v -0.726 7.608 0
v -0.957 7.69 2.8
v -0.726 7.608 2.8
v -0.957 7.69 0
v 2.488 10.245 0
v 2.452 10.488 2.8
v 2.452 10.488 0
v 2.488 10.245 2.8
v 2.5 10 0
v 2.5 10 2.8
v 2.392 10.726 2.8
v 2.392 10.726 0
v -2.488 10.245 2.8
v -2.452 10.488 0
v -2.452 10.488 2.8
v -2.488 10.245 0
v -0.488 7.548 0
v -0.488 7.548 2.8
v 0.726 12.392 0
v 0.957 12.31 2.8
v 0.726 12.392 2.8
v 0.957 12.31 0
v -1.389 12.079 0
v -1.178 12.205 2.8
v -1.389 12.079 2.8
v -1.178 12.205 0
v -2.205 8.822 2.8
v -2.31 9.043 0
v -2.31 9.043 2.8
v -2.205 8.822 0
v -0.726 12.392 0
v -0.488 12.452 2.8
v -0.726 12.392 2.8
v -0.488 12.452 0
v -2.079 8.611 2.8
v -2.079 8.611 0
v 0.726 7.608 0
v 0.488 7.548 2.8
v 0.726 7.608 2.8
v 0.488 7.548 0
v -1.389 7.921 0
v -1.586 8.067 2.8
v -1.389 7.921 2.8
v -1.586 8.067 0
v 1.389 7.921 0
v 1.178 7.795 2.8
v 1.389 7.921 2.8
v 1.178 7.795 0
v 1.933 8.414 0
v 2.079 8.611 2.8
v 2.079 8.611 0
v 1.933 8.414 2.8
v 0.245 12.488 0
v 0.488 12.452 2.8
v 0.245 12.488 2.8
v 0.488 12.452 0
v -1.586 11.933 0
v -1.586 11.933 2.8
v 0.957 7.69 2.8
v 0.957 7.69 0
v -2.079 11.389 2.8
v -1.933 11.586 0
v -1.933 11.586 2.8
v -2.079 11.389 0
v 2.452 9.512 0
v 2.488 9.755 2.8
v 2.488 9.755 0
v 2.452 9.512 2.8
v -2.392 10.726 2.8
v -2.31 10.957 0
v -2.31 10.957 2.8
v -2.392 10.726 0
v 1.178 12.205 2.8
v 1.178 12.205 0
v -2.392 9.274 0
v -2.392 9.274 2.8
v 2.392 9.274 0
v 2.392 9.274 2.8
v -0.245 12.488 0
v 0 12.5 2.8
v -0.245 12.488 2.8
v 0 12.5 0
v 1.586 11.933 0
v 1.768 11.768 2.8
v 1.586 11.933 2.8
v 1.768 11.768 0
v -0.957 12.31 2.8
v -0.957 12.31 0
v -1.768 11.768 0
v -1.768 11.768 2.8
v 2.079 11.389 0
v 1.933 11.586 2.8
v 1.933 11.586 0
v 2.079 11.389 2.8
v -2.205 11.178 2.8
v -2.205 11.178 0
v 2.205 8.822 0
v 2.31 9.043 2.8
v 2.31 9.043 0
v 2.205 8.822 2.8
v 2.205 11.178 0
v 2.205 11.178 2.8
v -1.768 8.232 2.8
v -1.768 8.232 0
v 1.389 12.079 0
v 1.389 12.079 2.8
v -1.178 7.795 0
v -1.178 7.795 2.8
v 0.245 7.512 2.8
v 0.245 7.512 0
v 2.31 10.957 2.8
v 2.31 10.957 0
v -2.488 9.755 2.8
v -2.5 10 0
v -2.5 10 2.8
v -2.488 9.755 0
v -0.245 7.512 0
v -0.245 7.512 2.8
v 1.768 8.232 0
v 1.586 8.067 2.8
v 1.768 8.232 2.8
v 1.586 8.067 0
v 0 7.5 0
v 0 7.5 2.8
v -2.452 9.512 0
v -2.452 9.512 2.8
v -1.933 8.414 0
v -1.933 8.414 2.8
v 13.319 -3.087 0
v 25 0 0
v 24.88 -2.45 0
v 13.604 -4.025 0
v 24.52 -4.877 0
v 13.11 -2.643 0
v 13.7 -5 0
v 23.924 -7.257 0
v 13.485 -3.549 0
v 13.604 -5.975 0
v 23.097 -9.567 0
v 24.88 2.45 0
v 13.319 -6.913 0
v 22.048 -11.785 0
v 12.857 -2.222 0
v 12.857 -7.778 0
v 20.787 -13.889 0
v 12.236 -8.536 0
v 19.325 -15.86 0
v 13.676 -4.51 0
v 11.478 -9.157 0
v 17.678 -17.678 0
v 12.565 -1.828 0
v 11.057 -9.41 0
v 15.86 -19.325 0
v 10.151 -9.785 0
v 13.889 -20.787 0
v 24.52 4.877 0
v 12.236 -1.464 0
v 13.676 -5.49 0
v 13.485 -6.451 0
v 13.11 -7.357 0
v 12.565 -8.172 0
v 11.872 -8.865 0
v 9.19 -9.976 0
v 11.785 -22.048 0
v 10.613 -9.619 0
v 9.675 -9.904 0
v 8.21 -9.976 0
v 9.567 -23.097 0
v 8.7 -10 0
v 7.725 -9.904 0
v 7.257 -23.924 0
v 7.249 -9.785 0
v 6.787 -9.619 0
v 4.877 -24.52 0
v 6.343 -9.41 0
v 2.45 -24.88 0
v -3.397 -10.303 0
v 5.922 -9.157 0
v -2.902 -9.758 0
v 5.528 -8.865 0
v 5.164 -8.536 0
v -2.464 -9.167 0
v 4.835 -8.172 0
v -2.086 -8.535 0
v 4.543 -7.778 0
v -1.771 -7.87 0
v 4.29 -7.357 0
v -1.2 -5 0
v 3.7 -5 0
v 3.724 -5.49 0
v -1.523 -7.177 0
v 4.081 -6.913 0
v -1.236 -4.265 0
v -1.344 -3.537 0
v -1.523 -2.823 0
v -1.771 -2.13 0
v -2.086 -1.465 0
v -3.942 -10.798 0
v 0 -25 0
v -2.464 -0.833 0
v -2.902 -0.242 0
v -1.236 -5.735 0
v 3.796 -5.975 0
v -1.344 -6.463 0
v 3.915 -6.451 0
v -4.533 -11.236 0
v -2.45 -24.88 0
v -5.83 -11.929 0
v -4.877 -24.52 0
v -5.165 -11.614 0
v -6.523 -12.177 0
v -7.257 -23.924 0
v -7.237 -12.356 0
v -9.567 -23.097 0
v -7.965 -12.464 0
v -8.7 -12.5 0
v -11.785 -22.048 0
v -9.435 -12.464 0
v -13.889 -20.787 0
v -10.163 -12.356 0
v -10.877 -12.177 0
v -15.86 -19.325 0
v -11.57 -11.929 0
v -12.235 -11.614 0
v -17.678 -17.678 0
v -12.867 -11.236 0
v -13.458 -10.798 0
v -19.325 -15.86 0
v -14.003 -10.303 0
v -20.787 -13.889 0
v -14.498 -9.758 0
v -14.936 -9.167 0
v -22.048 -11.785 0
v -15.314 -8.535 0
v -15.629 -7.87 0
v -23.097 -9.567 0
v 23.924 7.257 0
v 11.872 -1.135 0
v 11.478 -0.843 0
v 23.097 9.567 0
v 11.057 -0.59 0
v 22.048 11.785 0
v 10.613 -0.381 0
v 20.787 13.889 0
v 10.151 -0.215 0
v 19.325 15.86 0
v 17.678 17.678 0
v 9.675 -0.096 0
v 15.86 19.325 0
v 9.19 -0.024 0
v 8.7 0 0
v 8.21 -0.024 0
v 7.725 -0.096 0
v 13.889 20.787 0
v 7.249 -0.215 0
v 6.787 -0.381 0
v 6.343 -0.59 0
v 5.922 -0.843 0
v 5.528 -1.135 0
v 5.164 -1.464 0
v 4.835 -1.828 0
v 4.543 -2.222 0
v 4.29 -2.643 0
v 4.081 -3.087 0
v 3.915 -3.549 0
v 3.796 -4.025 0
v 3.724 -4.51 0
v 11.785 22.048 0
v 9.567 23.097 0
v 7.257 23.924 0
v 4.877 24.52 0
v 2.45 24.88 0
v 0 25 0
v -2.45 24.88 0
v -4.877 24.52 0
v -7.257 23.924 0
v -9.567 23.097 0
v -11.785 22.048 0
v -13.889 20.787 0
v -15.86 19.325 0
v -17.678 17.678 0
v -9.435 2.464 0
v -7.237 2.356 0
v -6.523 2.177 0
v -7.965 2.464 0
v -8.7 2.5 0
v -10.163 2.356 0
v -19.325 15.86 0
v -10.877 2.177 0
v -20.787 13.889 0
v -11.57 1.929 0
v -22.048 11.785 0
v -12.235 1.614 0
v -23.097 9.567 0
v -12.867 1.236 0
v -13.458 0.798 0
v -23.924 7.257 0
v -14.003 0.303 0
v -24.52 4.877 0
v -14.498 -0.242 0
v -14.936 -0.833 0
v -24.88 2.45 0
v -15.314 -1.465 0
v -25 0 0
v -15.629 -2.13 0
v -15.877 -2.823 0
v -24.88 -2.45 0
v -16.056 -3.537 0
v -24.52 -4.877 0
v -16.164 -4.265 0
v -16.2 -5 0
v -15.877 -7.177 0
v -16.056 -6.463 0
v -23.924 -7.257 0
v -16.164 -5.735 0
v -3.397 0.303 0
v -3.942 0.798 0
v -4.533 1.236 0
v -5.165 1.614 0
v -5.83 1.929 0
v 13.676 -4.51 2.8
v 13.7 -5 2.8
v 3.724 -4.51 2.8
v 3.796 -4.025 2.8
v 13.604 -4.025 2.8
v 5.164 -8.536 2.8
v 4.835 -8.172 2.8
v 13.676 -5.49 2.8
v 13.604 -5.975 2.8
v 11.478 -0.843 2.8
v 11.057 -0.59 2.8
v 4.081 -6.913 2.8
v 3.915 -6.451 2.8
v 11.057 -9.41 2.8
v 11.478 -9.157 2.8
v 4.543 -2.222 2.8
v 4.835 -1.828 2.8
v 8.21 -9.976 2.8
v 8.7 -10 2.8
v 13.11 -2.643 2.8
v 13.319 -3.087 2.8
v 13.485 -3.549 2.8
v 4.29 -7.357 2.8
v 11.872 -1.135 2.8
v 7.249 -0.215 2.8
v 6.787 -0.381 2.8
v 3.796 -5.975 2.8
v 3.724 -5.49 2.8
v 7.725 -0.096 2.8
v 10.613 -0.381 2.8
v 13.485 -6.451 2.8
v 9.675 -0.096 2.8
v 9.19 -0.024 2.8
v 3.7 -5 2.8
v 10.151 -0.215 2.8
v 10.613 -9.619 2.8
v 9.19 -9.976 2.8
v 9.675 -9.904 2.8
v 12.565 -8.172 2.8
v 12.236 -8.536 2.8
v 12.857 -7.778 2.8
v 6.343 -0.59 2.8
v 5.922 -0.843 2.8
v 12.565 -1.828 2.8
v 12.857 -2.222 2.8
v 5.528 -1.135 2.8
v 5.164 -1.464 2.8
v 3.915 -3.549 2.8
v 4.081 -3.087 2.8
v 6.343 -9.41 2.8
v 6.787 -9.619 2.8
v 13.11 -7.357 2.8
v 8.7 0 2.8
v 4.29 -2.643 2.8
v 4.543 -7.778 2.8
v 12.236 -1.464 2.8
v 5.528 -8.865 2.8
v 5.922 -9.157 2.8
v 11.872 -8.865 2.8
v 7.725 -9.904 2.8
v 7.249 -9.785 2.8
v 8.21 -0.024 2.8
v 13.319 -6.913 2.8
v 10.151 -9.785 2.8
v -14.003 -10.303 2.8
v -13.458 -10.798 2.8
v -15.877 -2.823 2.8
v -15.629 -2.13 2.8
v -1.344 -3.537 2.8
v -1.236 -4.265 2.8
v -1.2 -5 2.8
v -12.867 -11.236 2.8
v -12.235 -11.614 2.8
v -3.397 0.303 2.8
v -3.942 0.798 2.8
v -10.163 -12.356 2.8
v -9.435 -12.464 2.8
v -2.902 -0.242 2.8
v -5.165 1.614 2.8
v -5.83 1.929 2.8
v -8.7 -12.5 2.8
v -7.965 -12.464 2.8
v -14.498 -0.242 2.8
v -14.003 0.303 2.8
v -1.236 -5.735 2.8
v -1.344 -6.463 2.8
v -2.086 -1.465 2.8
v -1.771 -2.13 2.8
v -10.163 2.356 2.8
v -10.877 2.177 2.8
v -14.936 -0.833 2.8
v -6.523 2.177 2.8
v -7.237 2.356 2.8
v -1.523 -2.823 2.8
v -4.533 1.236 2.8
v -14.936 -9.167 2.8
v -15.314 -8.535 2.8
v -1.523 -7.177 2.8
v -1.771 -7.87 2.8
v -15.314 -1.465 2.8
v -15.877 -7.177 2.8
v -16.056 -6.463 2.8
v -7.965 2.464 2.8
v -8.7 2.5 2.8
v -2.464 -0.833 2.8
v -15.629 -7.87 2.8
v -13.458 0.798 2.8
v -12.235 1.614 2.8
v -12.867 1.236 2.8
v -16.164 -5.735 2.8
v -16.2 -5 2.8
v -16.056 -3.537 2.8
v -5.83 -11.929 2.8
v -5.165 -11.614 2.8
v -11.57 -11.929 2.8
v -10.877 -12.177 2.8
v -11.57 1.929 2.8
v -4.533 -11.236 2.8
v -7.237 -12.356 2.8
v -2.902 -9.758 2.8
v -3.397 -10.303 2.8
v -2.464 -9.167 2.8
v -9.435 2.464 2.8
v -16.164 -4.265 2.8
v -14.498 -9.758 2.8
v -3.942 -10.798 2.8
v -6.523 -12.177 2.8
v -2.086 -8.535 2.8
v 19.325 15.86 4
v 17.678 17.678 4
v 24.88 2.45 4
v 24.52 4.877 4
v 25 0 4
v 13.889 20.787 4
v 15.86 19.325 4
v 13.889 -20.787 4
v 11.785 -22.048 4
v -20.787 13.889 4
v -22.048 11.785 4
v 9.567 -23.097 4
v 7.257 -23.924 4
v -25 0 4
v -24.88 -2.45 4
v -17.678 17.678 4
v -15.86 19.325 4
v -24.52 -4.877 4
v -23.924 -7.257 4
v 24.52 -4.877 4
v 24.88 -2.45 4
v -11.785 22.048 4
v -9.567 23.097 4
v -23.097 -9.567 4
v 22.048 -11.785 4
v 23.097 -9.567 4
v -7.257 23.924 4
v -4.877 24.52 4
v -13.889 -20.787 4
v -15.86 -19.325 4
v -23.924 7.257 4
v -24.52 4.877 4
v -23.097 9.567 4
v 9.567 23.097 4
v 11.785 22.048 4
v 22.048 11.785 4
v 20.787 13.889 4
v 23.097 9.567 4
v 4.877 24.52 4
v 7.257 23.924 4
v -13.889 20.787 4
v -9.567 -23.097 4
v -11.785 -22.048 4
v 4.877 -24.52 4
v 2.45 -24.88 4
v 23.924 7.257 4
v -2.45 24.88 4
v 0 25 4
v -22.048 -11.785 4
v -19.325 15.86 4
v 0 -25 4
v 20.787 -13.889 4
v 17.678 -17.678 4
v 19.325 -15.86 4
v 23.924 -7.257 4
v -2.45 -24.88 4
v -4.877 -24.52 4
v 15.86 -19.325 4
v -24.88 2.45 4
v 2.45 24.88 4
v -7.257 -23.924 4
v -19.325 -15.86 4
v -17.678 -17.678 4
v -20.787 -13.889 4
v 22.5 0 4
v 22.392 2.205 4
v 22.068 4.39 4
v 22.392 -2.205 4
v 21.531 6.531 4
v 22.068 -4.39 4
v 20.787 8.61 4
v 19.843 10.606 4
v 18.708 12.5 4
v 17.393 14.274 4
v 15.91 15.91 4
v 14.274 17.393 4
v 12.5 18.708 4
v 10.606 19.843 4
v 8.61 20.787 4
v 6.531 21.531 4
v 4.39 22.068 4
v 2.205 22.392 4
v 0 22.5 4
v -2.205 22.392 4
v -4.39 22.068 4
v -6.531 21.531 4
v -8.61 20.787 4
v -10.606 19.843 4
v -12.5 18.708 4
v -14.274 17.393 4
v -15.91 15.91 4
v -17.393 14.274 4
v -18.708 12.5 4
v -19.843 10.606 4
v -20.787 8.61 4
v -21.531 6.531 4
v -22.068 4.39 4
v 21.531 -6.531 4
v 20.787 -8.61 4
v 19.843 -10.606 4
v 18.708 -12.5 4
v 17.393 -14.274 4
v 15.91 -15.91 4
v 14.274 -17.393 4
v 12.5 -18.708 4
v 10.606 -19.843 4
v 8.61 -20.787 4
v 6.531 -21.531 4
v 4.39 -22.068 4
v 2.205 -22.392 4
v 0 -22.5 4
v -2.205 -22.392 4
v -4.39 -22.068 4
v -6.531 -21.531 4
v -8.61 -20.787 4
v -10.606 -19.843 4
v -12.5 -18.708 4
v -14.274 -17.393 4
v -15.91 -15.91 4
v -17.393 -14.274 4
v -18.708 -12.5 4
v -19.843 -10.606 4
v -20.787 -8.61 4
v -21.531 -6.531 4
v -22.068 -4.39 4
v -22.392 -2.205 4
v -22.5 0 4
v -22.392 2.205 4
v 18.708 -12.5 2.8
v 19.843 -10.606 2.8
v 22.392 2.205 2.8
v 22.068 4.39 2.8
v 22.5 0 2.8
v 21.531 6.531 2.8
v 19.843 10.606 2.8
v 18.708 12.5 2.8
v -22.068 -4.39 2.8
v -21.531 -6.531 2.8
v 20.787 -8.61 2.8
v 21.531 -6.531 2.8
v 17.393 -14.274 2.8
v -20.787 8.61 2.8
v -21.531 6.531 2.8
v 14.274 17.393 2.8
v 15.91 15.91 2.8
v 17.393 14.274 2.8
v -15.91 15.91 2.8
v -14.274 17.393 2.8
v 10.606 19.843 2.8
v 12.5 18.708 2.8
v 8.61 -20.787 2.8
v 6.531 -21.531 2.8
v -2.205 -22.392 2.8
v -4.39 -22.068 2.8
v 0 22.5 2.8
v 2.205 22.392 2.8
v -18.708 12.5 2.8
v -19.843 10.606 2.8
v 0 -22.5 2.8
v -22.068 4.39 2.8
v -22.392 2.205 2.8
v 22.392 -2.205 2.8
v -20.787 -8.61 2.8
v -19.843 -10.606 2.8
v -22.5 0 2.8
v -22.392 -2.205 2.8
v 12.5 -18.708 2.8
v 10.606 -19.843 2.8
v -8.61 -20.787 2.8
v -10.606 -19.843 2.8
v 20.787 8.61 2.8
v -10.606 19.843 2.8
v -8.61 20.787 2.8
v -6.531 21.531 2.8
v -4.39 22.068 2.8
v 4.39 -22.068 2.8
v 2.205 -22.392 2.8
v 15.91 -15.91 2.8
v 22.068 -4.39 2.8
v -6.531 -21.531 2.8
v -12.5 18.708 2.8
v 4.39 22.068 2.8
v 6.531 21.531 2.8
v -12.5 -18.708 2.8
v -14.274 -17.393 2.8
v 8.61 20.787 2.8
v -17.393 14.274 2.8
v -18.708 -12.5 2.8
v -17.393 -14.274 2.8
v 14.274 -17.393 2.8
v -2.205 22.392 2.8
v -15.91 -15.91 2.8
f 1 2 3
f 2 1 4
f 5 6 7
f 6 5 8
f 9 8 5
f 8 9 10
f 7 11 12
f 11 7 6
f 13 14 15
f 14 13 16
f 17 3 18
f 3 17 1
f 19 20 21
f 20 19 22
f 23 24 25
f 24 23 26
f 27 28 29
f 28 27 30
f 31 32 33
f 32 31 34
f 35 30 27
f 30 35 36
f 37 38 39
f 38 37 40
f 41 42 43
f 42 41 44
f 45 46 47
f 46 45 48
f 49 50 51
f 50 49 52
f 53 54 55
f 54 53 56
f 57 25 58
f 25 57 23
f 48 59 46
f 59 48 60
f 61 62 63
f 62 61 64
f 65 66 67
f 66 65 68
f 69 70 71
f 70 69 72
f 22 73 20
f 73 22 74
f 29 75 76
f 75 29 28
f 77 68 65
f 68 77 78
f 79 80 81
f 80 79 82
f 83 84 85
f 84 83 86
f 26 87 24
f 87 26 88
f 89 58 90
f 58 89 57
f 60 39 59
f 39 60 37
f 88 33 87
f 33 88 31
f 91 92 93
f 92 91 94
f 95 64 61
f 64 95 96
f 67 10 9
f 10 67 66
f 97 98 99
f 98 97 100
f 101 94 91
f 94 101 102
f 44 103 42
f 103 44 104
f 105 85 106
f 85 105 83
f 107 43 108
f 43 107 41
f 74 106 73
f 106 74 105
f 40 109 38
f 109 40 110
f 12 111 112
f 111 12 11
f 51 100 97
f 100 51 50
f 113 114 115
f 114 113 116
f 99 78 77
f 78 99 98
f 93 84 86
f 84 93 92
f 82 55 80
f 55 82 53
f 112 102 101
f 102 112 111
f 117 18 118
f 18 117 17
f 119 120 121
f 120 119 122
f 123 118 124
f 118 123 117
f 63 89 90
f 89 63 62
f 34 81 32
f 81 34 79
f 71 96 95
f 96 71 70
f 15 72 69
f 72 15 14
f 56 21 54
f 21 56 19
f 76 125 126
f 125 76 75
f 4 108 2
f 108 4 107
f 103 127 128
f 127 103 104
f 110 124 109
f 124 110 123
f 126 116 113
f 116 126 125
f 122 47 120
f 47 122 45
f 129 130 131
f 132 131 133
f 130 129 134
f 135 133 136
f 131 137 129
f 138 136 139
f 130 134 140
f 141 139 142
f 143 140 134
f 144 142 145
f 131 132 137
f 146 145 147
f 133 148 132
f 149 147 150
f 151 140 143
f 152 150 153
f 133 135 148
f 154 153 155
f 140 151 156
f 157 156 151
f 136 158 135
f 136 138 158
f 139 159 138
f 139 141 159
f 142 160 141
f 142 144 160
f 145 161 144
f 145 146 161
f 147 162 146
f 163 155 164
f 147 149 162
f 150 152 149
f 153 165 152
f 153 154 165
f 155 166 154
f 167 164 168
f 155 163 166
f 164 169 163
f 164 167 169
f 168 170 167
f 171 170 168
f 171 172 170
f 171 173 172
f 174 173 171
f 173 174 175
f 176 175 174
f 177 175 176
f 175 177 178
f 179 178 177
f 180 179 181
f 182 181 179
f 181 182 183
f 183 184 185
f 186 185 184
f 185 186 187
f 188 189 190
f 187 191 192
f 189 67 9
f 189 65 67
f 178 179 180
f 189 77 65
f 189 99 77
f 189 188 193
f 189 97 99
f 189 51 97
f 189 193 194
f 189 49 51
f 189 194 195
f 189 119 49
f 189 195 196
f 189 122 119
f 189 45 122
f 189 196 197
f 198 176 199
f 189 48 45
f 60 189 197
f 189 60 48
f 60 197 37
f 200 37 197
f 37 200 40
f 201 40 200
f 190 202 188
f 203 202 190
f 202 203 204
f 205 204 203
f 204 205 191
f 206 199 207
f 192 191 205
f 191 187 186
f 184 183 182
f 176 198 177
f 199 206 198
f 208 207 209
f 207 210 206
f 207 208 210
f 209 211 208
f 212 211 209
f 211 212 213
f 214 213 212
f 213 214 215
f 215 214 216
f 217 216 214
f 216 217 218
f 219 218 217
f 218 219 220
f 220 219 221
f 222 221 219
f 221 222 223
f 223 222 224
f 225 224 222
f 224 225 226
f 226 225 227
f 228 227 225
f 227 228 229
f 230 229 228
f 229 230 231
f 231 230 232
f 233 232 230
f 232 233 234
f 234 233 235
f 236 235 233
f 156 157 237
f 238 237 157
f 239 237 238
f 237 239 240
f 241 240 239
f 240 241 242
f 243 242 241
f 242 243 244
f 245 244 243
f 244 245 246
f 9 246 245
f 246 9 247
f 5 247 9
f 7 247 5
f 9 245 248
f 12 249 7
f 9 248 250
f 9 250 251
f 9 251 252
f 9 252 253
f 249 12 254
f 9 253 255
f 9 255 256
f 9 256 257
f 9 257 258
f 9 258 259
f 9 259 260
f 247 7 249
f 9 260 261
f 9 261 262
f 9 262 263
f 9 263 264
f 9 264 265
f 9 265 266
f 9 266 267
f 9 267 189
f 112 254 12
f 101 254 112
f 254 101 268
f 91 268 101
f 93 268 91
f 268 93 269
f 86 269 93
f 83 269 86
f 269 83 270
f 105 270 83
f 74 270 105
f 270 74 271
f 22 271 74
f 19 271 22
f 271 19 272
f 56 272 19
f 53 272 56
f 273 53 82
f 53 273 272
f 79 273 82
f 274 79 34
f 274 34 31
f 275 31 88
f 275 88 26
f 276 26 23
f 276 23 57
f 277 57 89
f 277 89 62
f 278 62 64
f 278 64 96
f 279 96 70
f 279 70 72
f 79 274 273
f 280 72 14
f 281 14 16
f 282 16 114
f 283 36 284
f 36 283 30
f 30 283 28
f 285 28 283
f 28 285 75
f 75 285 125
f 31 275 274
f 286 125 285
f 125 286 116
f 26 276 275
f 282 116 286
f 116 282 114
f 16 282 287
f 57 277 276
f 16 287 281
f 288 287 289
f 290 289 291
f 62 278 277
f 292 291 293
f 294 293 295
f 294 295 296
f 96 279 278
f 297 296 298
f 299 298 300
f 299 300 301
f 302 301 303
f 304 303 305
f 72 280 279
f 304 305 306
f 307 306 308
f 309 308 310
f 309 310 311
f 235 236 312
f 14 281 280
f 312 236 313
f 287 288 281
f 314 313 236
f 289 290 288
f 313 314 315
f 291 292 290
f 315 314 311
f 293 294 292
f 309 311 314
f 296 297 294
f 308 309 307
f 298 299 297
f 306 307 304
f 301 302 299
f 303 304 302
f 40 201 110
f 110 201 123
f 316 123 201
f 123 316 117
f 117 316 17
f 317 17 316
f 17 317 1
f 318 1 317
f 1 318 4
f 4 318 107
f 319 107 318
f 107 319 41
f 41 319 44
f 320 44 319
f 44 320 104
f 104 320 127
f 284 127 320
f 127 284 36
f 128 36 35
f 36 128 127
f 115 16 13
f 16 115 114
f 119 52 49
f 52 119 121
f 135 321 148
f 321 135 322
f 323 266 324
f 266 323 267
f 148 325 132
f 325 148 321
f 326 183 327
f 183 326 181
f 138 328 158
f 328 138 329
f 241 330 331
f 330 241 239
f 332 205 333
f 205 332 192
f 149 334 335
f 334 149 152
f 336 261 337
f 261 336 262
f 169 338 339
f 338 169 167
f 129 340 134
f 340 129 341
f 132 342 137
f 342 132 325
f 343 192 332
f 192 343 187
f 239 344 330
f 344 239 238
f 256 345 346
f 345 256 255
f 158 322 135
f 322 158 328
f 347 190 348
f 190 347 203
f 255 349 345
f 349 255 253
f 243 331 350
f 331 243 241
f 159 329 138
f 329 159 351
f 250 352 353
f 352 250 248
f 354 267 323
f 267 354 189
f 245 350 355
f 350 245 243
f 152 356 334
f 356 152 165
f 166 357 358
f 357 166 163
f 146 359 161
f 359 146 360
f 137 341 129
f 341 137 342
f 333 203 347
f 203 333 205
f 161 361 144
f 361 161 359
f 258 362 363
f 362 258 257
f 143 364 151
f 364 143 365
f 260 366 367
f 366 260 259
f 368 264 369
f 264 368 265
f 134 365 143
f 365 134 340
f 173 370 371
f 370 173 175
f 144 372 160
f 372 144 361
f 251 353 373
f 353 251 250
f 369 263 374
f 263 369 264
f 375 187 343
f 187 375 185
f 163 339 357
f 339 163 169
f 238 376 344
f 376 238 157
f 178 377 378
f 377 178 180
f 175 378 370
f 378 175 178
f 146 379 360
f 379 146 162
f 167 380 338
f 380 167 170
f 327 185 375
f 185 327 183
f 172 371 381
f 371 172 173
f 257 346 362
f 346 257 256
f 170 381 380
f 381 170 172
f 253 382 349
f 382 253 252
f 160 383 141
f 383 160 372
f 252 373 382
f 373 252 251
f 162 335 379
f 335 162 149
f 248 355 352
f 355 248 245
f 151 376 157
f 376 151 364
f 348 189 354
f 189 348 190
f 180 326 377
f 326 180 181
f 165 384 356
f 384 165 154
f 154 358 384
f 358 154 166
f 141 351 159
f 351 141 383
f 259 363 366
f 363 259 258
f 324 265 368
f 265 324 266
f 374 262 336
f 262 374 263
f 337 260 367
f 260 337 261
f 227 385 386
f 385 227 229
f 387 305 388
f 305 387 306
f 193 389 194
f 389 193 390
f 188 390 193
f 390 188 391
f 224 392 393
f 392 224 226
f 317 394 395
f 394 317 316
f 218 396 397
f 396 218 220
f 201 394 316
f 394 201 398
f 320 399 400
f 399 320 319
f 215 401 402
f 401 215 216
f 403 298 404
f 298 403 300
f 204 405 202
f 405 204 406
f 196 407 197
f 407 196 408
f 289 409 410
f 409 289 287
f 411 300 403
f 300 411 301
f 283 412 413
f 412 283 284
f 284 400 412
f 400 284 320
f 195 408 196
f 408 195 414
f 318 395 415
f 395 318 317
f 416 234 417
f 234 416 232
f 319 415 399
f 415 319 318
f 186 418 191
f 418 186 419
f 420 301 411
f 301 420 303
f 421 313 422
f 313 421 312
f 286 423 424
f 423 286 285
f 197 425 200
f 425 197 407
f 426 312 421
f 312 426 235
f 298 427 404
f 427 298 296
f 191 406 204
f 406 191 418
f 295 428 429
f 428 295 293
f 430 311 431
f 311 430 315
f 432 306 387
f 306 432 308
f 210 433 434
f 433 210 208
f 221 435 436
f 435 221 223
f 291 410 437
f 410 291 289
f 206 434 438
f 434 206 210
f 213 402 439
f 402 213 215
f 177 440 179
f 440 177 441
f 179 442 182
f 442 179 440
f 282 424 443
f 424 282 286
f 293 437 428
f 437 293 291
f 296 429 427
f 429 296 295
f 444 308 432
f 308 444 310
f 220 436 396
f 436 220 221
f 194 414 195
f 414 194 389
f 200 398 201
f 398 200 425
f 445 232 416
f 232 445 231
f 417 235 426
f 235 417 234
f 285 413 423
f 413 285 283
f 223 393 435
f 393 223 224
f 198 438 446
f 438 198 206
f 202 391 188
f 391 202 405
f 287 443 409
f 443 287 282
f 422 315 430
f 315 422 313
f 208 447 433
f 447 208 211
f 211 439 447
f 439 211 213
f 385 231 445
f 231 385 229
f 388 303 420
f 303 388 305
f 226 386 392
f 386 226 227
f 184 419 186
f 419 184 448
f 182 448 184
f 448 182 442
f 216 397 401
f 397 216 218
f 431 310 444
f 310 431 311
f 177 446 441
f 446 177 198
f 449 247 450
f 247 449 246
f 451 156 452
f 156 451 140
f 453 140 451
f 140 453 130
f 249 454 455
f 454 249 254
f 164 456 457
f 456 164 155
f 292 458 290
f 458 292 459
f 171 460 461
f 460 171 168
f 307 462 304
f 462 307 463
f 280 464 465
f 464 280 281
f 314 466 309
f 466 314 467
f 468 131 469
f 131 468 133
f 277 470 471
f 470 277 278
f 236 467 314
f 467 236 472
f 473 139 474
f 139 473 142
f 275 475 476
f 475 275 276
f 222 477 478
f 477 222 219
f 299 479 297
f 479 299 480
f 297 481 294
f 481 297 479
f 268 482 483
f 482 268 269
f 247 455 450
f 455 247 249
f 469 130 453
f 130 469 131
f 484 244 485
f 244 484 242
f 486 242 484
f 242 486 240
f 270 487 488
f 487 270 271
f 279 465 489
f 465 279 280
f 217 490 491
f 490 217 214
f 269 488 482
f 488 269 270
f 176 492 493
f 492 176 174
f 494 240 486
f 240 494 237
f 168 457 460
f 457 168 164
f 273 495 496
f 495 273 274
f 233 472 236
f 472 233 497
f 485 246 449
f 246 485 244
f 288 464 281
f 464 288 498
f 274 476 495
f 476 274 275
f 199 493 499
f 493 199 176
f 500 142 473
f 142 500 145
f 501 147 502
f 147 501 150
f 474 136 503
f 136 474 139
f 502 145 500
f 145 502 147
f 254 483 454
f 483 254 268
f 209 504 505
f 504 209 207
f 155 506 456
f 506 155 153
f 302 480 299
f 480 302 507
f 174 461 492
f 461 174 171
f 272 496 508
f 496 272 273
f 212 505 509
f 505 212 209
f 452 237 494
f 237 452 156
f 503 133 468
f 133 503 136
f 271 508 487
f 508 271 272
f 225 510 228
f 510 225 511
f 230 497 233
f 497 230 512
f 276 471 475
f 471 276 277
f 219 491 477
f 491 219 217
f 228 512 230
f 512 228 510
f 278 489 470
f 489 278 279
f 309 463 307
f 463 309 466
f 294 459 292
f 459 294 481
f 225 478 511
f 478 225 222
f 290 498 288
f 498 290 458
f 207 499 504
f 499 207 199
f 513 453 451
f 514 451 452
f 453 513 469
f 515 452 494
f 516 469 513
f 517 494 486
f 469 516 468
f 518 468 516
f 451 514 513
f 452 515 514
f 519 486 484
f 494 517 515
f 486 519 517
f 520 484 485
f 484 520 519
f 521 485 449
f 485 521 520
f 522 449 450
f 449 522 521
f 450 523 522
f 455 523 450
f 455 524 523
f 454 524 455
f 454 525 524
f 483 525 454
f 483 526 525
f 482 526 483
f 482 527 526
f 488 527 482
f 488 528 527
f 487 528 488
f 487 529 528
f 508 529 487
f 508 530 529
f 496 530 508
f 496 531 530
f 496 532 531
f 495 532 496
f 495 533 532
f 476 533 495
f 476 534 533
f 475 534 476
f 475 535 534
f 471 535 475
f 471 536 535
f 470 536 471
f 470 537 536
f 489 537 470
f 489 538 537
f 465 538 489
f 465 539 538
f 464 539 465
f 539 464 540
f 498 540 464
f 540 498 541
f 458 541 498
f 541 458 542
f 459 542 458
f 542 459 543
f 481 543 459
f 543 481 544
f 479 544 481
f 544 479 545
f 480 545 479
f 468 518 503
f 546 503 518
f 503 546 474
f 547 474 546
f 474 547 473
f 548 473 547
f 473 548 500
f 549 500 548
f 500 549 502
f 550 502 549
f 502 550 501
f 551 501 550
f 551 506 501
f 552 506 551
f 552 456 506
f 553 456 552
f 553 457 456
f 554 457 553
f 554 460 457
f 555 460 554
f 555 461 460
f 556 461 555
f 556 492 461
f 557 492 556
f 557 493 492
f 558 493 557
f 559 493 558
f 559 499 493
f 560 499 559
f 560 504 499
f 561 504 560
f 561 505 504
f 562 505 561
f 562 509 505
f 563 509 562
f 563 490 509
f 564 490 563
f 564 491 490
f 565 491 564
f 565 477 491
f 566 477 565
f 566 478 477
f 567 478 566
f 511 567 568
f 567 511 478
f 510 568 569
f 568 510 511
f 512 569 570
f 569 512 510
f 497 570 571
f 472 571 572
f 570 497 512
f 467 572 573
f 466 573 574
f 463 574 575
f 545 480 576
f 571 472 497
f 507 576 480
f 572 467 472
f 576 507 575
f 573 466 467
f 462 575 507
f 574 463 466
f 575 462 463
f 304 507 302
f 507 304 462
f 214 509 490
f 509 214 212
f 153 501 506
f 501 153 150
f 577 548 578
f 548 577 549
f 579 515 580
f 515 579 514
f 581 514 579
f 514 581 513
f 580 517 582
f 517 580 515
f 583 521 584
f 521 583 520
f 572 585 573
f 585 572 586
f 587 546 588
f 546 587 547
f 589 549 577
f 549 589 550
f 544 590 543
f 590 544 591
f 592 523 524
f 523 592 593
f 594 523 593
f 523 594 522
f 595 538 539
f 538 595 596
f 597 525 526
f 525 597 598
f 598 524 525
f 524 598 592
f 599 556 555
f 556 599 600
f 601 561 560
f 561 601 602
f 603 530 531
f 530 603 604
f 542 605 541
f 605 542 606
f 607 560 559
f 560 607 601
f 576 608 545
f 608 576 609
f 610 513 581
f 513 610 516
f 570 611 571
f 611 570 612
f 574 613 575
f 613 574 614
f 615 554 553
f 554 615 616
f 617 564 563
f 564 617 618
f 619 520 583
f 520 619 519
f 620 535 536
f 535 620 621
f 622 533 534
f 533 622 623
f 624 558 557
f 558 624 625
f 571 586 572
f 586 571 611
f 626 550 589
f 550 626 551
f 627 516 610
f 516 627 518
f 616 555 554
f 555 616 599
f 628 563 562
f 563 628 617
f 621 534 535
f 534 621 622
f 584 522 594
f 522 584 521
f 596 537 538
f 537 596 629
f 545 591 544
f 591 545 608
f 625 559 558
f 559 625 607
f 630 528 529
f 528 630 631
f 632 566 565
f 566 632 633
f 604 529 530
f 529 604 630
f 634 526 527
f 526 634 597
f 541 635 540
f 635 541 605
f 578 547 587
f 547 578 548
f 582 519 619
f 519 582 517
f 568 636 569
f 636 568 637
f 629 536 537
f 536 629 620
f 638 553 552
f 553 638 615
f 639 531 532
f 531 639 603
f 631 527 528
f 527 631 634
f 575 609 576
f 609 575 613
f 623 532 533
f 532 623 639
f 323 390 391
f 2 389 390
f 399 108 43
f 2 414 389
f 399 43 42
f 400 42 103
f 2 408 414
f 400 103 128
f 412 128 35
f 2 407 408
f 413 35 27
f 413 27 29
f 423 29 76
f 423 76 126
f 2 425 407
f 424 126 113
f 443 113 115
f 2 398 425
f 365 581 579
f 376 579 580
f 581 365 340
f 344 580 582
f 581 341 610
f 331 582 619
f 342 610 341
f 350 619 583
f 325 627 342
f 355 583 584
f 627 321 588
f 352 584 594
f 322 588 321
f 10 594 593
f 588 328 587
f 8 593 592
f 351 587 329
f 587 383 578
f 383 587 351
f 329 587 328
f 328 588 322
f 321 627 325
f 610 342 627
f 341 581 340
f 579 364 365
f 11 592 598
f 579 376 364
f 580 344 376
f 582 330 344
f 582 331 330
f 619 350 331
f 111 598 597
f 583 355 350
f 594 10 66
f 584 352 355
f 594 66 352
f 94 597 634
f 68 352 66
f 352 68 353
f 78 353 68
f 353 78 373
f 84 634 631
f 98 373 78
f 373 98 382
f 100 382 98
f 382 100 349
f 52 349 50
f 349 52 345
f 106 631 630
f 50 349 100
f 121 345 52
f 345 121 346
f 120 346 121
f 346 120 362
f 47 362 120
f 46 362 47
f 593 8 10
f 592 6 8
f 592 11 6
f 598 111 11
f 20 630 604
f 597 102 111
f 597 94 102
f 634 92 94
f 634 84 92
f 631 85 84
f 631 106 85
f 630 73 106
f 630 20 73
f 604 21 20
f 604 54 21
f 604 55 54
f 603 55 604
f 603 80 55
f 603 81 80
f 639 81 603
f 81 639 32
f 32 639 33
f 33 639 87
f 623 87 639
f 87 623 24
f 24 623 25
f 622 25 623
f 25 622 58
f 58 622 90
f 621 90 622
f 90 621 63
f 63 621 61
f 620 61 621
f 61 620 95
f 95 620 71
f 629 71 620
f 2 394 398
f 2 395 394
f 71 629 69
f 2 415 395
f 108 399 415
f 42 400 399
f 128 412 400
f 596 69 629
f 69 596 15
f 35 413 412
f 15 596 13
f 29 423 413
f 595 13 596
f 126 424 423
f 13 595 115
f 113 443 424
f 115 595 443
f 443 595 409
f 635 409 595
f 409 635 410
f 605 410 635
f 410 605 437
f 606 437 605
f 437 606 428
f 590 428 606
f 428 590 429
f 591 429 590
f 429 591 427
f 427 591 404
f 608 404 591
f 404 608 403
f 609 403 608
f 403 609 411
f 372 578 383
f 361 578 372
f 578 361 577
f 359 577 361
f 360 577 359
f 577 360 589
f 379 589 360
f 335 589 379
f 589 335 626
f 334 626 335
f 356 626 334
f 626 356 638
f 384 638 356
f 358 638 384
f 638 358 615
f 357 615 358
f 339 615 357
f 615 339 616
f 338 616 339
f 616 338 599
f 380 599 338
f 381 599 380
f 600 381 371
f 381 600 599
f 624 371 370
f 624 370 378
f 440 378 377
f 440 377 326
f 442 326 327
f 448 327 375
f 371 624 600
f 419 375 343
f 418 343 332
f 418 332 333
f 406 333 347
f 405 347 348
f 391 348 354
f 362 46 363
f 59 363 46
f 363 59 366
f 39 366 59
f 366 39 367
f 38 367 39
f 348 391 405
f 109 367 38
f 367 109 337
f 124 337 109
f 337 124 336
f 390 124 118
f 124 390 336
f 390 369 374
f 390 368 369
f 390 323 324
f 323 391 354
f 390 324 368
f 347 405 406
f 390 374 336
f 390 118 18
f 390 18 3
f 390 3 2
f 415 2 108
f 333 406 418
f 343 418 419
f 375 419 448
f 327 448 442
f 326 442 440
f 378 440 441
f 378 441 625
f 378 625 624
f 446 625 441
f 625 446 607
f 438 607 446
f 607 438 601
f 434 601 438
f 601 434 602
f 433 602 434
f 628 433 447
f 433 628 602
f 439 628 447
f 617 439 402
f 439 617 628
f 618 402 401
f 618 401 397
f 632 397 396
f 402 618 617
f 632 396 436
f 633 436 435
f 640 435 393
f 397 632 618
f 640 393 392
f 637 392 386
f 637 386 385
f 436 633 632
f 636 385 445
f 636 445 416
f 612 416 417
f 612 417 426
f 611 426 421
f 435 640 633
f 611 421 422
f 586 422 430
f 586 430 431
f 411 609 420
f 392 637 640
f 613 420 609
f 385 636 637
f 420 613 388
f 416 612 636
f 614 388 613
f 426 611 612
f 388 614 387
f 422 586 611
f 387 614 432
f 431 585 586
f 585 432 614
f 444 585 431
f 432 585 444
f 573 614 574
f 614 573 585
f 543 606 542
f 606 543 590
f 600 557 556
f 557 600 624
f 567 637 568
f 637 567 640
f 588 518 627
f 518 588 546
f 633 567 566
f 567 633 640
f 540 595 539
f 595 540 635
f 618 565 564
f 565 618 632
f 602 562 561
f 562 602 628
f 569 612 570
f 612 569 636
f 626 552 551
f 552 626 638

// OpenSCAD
$fn = 64*1;

diameter = 50; //[25:75]
height = 4; //[4:7]
number_of_holes = 3; //[1:5]
hole_diameter_start = 5; //[5:20]
hole_diameter_end = 15; //[15:40]
hole_offset = 10; //[0:50]
lip_ratio = 70; //[0:100]
edge_ratio = 90; //[0:100]

main();

module main(){
	difference(){
		cylinder(h = height, r = diameter/2); 
		if (number_of_holes == 1) {
			oneHole();
		} else if (number_of_holes == 2) {
			twoHoles();
		} else if (number_of_holes == 3) {
			threeHoles();
		} else if (number_of_holes == 4){
			fourHoles();
		} else {
			fiveHoles();
		}
		translate(v=[0,0,height*lip_ratio*.01])
		cylinder(h = 25, r = diameter/2*edge_ratio*.01);
	}
}

module oneHole() {
	cylinder(h=25, r = hole_diameter_start/2);
}

module twoHoles() {
	translate(v=[hole_offset, 0, 0])
	cylinder(h = 25, r = hole_diameter_start/2);
	translate(v=[-hole_offset, 0, 0])
	cylinder(h = 25, r = hole_diameter_end/2);	
}

module threeHoles() {
	translate(v=[0, hole_offset, 0])
	cylinder(h = 25, r = hole_diameter_start/2);
	translate(v=[.87*hole_offset, -.5*hole_offset, 0])
	cylinder(h = 25, r = ( hole_diameter_end - hole_diameter_start )/2);
	translate(v=[-.87*hole_offset, -.5*hole_offset, 0])
	cylinder(h = 25, r = hole_diameter_end/2);	
}

module fourHoles() {
	translate(v=[hole_offset, hole_offset, 0])
	cylinder(h = 25, r = hole_diameter_start/2);
	translate(v=[-hole_offset, hole_offset, 0])
	cylinder(h = 25, r = ( hole_diameter_end - hole_diameter_start )/6 + hole_diameter_start/2);	
	translate(v=[hole_offset, -hole_offset, 0])
	cylinder(h = 25, r = ( hole_diameter_end - hole_diameter_start )/3 + hole_diameter_start/2);	
	translate(v=[-hole_offset,-hole_offset,0])
	cylinder(h = 25, r = hole_diameter_end/2);
}

module fiveHoles() {
	translate(v=[0, hole_offset, 0])
	cylinder(h = 25, r = hole_diameter/2);
	translate(v=[hole_offset*.95, hole_offset*.31, 0])
	cylinder(h = 25, r =     ( hole_diameter_end - hole_diameter_start )/8 + hole_diameter_start/2);	
	translate(v=[hole_offset*.59, -hole_offset*.81, 0])
	cylinder(h = 25, r =     ( hole_diameter_end - hole_diameter_start )/4 + hole_diameter_start/2);	
	translate(v=[-hole_offset*.59,-hole_offset*.81,0])
	cylinder(h = 25, r = 3 * ( hole_diameter_end - hole_diameter_start )/8 + hole_diameter_start/2);	
	translate(v=[-hole_offset*.95,hole_offset*.31,0])
	cylinder(h = 25, r = hole_diameter/2);
}
